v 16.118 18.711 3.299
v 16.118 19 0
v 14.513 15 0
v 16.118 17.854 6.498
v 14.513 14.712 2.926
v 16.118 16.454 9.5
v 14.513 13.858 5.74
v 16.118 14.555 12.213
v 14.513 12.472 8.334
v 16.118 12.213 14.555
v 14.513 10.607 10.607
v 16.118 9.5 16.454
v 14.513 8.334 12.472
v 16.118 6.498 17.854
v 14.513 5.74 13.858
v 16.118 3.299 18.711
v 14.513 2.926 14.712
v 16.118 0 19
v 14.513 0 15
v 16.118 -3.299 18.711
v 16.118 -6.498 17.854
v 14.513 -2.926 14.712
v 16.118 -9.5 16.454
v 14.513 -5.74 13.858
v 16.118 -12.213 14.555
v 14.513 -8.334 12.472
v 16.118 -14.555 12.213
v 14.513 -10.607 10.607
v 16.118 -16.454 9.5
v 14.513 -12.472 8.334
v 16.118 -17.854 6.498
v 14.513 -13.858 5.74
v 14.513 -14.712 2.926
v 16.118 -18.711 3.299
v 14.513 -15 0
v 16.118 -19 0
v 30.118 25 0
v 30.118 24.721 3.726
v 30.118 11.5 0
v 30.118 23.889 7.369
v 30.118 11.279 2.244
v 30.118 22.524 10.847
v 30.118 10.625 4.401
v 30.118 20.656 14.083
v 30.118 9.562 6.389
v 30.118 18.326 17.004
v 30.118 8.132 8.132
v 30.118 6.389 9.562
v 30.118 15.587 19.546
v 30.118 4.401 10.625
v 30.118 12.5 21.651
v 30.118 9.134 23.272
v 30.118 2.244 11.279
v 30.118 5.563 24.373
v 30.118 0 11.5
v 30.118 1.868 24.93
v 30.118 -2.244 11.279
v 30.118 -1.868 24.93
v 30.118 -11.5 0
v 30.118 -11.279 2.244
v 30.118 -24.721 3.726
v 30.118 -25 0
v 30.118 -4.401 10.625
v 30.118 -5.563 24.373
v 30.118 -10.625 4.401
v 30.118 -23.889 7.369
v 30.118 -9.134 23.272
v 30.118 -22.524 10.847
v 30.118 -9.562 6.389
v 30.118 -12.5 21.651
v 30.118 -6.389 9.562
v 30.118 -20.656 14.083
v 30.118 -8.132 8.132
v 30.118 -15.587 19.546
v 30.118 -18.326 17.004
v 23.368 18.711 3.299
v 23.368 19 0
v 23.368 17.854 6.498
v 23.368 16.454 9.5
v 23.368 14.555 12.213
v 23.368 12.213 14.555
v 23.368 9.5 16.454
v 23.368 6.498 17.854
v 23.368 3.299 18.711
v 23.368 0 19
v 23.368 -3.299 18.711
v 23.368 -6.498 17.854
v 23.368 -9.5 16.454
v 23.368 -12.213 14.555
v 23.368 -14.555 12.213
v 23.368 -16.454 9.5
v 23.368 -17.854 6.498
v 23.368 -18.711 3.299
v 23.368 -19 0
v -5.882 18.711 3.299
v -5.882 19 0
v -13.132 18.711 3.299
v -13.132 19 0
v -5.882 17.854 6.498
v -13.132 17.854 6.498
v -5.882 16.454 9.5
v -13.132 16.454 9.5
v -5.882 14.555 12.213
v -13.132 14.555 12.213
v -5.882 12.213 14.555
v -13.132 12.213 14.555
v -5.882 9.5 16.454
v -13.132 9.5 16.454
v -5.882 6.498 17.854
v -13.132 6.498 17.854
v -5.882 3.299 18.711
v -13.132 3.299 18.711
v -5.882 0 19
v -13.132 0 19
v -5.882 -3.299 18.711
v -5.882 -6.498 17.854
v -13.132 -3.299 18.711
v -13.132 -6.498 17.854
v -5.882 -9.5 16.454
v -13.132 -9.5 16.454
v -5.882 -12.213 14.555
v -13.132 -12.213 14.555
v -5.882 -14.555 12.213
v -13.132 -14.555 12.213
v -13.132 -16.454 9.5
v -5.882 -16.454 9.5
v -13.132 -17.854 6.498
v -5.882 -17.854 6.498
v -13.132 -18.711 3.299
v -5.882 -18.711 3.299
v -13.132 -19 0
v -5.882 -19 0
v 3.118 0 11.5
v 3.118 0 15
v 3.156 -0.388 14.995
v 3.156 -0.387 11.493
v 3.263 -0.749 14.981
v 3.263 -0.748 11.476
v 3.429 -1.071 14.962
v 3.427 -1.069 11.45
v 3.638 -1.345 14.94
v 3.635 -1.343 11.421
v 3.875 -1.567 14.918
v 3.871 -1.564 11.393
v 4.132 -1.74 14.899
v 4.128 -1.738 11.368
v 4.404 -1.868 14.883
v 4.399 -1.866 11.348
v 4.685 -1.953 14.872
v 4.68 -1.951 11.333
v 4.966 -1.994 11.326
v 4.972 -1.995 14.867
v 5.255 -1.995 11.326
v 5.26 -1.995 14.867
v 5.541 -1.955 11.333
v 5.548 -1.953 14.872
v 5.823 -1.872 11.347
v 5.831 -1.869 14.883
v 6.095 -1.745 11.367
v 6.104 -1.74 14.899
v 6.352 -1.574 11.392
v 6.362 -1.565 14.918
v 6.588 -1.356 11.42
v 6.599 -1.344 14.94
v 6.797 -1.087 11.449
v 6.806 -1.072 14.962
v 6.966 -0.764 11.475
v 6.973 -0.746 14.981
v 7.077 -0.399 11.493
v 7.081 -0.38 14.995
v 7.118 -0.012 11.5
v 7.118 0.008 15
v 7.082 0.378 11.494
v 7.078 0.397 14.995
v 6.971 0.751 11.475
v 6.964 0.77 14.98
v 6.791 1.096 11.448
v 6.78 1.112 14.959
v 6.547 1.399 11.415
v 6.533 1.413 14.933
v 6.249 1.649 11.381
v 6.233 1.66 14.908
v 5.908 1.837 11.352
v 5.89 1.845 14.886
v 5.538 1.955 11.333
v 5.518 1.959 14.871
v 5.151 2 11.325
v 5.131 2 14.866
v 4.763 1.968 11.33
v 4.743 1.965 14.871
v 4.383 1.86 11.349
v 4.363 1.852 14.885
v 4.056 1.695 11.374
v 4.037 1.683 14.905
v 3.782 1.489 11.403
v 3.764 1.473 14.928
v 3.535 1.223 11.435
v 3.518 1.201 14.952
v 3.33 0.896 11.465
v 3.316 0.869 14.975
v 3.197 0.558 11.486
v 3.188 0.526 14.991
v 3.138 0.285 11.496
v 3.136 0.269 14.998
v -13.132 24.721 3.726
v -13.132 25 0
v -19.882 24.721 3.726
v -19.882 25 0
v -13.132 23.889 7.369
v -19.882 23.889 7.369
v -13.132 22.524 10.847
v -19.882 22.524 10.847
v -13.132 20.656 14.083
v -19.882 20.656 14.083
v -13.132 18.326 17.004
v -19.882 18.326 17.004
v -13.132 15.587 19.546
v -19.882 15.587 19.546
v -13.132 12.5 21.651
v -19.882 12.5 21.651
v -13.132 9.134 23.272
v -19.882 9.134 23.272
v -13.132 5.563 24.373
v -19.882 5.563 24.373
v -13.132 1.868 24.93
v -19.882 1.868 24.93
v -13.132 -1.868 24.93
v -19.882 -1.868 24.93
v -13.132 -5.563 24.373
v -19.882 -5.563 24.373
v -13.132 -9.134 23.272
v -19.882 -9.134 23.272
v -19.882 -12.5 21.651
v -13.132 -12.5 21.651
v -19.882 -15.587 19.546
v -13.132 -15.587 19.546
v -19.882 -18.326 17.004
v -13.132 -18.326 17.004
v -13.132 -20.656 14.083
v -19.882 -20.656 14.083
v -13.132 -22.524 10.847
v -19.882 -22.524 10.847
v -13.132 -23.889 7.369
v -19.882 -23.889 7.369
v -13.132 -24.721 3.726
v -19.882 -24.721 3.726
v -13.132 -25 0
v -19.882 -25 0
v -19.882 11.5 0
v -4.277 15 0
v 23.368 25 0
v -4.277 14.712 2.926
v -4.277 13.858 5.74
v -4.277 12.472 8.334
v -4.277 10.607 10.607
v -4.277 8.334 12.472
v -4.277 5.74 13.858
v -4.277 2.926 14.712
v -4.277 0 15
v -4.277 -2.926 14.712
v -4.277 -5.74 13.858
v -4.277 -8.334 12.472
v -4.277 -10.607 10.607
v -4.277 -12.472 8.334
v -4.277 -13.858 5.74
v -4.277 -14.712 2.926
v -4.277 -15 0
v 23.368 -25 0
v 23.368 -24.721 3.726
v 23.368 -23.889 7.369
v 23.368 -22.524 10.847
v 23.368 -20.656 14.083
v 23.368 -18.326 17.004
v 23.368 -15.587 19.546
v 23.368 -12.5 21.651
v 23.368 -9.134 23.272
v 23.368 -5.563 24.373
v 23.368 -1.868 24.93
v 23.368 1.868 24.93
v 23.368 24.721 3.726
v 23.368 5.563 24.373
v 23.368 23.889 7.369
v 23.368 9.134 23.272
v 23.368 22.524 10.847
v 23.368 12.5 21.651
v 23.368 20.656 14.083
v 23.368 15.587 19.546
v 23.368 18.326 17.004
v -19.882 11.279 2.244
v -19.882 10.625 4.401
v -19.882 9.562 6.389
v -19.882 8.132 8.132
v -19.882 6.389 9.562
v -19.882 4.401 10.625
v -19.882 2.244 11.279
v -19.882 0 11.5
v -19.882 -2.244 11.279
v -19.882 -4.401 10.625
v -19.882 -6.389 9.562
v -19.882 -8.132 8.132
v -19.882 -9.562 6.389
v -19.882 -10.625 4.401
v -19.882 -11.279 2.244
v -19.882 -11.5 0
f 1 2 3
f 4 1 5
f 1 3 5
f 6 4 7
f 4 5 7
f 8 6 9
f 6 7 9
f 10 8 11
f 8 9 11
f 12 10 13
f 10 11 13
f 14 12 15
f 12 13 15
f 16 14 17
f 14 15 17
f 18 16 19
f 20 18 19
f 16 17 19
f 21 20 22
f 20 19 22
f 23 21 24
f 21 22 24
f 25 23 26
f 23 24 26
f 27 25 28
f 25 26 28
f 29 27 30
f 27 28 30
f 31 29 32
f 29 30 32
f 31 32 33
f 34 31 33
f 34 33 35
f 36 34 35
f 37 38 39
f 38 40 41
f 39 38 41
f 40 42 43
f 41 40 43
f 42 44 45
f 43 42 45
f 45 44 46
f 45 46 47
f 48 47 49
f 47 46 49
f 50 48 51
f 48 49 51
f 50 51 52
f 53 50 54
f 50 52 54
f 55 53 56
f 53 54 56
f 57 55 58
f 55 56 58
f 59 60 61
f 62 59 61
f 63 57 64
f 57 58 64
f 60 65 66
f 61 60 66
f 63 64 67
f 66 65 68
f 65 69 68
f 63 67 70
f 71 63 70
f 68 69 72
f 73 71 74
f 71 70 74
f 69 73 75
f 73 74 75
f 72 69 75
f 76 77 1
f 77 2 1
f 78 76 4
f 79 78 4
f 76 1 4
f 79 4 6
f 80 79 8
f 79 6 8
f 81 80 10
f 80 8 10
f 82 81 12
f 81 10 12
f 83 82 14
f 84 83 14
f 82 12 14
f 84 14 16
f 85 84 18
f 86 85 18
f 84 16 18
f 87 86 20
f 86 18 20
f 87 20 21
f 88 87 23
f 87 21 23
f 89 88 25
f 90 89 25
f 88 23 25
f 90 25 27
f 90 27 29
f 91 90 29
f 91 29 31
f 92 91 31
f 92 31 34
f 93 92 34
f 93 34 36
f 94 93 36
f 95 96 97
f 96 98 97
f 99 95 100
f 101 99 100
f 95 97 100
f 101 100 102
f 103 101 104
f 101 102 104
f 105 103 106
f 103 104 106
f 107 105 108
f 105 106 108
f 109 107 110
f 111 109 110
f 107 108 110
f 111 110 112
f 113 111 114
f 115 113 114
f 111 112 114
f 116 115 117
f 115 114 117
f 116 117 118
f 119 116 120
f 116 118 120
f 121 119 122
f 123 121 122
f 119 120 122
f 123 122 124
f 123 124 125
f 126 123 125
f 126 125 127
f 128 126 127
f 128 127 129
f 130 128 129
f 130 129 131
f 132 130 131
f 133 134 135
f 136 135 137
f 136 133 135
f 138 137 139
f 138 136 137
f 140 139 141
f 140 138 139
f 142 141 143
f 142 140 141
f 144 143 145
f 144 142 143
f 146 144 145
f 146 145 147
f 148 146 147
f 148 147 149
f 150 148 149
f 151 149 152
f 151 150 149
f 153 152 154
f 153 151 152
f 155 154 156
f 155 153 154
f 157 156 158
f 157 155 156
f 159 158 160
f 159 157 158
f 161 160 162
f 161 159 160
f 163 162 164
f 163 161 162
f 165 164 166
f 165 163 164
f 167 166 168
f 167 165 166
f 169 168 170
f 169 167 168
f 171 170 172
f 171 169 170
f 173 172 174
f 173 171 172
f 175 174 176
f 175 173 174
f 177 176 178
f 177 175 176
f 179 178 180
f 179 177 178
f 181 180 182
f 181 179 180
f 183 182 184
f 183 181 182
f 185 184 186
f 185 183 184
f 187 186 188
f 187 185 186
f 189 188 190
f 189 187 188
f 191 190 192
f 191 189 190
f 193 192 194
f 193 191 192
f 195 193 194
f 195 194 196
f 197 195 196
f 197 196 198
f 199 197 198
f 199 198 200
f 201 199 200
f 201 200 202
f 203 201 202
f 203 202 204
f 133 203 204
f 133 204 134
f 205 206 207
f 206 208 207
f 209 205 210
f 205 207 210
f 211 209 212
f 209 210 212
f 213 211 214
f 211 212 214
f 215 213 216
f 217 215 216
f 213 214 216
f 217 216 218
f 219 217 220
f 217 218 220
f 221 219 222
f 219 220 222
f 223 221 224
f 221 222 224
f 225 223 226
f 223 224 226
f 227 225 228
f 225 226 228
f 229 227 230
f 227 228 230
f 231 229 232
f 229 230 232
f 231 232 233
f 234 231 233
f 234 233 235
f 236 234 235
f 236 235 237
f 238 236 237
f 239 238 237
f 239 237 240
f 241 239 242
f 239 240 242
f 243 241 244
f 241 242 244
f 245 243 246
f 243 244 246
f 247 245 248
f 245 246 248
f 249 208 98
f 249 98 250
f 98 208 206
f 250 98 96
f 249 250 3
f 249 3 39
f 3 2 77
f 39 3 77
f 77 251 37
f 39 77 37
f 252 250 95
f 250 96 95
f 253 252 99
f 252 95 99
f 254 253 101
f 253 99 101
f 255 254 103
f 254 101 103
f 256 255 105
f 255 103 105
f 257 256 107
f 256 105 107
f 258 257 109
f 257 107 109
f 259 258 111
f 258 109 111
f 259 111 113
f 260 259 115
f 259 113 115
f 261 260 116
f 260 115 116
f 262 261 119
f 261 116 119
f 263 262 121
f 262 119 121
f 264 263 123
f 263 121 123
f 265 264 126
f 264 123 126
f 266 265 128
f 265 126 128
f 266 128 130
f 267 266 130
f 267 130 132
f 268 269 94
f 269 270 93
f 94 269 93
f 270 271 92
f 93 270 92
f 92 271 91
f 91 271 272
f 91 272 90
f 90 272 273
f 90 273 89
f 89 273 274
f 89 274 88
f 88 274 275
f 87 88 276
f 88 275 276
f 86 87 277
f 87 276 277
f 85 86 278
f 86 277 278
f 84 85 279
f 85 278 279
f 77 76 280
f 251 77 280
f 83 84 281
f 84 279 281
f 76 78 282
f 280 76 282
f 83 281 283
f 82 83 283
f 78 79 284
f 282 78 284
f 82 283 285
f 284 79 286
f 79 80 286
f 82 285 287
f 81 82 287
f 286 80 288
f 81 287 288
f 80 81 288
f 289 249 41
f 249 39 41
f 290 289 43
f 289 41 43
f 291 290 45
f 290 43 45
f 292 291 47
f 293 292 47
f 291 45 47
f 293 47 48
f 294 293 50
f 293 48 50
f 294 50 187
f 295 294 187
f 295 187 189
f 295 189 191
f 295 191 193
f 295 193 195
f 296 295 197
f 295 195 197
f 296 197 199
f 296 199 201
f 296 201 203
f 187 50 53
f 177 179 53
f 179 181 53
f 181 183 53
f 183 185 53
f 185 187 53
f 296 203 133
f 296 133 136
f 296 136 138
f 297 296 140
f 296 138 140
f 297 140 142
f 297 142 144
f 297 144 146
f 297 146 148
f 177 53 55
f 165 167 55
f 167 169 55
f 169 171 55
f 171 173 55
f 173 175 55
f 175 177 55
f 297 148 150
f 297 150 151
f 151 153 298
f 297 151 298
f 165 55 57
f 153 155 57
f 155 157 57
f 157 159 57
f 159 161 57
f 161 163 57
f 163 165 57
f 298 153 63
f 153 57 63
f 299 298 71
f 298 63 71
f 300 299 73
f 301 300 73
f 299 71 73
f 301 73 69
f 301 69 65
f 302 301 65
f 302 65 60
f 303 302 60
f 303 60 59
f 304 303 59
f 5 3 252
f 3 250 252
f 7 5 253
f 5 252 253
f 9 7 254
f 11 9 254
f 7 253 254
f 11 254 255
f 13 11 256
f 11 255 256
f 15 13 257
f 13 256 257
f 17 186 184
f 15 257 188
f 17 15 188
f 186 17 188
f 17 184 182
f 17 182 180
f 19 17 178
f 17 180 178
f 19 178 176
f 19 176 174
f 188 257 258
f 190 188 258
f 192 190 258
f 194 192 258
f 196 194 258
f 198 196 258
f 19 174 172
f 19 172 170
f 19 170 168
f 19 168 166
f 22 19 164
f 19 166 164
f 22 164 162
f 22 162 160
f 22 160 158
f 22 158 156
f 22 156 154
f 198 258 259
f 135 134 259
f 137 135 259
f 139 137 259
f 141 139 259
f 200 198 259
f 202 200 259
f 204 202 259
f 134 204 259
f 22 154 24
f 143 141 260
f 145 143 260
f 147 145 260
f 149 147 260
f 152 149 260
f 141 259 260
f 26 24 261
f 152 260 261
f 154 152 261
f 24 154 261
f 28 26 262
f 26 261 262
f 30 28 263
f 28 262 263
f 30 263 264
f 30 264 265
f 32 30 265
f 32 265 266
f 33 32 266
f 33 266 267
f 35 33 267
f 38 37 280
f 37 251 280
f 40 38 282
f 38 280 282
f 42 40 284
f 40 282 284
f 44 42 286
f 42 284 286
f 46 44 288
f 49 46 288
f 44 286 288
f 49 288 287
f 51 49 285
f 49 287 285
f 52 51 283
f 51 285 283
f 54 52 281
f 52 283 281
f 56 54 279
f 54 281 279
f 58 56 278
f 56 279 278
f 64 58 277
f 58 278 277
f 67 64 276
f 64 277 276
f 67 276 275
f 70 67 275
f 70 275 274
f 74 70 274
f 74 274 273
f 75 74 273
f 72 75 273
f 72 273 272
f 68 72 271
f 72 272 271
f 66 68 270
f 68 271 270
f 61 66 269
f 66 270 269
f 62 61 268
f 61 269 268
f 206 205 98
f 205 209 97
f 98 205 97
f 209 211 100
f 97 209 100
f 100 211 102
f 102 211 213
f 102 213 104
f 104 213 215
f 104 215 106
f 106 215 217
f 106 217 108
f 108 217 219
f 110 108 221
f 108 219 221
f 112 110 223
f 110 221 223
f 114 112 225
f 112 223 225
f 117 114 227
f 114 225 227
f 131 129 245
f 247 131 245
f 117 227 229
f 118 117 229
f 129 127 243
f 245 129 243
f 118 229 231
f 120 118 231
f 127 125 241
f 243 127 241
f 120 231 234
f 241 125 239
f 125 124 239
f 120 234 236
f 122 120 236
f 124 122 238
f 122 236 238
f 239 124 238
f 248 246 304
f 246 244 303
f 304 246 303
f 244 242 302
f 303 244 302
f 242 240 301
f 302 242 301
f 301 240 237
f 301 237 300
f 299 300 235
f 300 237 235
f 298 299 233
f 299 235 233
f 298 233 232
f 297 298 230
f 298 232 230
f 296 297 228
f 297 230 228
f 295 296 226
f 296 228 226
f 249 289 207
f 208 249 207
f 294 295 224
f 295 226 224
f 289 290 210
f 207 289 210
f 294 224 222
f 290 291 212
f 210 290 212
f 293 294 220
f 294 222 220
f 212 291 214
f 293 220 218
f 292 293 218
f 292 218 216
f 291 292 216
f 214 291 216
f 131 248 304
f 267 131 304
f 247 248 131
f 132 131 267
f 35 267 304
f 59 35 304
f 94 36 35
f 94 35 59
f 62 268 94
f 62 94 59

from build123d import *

# Parameters (mm, degrees)
REVOLVE1_ANGLE = 180
SKETCH3_W      = 2
SKETCH3_H      = 15


with BuildPart() as part:
    # Sketch1 → Revolve1 (revolve)
    with BuildSketch(Plane.XY):
        Polygon((-19.882341212, 25), (-19.882341212, 11.5), (30.117658788, 11.5), (30.117658788, 25), (23.367658788, 25), (23.367658788, 19), (16.117658788, 19), (14.512644781, 15), (-4.277327206, 15), (-5.882341212, 19), (-13.132341212, 19), (-13.132341212, 25), align=None)
    revolve(axis=Axis((-47.288030425, 0, 0), (1, 0, 0)), revolution_arc=REVOLVE1_ANGLE)

    # Sketch3 → Cut-Revolve1 (revolve, cut)
    with BuildSketch(Plane(origin=(0, 0, 0), x_dir=(1, 0, 0), z_dir=(0, 1, 0))):
        with Locations((4.117658788, -7.5)):
            Rectangle(SKETCH3_W, SKETCH3_H)
    revolve(axis=Axis((5.117658788, 0, 0), (0, 0, 1)), mode=Mode.SUBTRACT)


solid = part.part
